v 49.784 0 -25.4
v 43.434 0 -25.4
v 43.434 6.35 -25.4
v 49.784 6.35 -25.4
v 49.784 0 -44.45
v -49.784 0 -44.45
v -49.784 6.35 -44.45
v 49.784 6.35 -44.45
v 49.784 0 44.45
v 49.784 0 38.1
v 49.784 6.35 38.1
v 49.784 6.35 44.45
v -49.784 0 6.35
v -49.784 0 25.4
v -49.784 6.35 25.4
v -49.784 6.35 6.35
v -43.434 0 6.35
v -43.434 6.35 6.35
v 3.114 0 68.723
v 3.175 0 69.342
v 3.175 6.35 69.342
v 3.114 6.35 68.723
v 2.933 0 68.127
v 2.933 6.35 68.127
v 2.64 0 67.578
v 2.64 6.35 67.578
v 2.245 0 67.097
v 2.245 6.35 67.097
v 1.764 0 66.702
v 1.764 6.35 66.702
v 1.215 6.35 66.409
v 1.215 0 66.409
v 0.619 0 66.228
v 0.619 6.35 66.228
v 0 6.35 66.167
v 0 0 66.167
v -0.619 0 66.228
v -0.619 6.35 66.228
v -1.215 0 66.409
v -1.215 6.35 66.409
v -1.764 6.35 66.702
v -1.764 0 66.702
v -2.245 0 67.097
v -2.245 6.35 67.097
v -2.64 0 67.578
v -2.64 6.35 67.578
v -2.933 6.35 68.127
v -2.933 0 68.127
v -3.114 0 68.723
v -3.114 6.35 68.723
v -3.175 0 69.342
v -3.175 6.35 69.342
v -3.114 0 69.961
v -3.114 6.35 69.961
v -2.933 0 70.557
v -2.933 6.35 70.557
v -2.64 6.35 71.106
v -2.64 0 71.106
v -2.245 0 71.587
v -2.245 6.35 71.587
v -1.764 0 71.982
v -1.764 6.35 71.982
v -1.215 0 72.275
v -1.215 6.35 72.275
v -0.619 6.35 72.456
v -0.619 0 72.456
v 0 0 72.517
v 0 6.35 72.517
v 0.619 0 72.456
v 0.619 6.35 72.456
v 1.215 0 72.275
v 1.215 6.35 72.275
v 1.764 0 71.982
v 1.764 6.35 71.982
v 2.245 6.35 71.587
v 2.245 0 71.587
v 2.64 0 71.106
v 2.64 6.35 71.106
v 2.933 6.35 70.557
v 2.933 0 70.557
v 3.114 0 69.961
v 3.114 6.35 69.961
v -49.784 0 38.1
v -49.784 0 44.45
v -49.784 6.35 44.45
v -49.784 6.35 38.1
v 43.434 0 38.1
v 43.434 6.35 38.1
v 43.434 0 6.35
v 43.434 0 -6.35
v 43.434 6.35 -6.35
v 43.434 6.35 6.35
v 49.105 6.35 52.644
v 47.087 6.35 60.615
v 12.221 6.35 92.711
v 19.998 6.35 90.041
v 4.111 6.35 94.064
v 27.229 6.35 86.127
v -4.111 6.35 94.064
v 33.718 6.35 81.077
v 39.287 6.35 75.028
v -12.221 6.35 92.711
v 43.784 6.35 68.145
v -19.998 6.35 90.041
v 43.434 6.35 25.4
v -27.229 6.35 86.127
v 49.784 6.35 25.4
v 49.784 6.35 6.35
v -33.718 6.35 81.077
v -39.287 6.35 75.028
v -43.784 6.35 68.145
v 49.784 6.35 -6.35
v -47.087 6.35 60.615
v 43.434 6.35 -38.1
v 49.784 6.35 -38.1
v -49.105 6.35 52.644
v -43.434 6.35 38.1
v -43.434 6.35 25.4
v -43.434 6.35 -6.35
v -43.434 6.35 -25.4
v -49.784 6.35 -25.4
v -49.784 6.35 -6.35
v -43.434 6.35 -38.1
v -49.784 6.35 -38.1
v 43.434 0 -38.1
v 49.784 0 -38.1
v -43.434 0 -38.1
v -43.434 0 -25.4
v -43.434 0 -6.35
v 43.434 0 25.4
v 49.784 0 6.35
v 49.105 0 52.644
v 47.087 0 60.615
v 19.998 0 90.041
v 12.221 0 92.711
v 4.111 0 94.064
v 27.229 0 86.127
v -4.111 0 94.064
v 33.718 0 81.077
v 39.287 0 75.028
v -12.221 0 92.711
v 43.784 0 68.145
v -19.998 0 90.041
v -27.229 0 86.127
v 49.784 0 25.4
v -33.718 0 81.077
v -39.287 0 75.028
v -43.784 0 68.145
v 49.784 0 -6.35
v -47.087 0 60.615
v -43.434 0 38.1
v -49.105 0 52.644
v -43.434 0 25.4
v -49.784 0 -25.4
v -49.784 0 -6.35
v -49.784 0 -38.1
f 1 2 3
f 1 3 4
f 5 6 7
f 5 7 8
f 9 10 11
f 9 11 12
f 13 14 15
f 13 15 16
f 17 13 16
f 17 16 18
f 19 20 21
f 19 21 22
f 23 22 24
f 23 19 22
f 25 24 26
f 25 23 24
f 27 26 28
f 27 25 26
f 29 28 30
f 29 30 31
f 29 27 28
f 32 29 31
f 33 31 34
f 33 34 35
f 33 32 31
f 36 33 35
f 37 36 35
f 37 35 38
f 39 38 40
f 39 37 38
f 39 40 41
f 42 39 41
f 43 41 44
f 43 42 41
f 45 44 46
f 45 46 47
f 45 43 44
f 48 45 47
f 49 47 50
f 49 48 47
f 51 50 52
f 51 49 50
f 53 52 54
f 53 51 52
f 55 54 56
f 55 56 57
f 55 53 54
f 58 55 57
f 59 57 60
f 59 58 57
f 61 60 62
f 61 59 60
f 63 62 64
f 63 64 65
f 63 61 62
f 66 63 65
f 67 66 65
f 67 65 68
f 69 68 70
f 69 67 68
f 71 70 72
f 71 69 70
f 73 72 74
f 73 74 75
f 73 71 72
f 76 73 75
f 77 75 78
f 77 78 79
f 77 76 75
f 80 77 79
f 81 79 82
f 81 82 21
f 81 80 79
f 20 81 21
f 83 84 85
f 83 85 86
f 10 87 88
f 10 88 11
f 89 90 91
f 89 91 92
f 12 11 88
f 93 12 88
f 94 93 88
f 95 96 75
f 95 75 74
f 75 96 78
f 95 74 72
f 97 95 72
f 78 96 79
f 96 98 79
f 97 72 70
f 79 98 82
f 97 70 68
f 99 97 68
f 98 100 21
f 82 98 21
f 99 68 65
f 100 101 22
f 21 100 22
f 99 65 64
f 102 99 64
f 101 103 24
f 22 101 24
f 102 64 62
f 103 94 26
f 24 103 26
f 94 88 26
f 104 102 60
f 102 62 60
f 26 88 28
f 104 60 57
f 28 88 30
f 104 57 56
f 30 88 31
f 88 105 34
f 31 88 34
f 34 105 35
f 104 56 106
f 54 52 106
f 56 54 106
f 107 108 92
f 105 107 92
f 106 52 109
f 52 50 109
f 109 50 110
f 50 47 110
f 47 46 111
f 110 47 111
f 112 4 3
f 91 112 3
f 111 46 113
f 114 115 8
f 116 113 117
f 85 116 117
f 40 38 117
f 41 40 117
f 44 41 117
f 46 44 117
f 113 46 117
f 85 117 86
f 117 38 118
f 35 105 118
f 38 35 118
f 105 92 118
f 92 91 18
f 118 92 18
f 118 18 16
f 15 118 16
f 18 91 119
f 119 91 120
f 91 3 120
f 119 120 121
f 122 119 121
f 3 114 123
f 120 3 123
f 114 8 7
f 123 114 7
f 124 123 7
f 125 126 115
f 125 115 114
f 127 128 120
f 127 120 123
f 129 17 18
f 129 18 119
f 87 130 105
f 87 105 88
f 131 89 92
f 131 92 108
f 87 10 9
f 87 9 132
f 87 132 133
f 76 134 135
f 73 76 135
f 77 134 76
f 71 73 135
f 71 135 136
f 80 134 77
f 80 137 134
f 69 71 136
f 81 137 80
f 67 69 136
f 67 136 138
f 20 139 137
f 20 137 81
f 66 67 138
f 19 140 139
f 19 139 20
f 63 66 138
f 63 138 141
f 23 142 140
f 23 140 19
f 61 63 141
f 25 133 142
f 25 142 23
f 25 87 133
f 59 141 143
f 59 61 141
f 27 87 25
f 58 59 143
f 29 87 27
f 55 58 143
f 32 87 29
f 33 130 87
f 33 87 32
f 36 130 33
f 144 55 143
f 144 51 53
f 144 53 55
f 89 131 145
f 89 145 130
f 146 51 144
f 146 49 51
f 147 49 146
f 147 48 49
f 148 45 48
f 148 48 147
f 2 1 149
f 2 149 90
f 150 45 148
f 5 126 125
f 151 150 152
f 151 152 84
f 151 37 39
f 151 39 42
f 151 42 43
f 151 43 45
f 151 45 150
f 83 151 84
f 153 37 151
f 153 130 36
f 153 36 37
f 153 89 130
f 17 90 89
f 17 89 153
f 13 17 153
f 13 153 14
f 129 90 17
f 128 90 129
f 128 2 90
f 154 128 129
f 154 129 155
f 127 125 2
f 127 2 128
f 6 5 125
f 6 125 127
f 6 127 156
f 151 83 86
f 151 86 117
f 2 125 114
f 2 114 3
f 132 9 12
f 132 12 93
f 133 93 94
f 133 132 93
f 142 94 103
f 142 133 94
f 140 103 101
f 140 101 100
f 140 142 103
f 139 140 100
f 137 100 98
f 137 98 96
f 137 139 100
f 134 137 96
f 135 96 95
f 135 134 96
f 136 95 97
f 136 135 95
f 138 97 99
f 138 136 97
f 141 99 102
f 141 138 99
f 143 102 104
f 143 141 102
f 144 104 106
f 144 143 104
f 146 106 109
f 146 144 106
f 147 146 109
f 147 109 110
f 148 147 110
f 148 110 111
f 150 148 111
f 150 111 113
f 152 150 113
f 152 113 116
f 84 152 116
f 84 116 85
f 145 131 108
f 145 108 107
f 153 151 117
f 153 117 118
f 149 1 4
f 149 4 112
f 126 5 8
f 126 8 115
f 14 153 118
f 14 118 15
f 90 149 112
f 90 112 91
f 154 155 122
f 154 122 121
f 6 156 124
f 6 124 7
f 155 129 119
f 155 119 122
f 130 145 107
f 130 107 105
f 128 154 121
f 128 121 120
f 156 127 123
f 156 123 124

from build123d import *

# Parameters (mm, degrees)
SKETCH1_R           = 3.175
BOSS_EXTRUDE1_DEPTH = 6.35


with BuildPart() as part:
    # Sketch1 → Boss-Extrude1 (new body)
    with BuildSketch(Plane(origin=(0, 0, 0), x_dir=(1, 0, 0), z_dir=(0, 1, 0))):
        with BuildLine():
            Line((-49.784, 44.45), (49.784, 44.45))
            Line((49.784, 44.45), (49.784, 38.1))
            Line((49.784, 38.1), (43.434, 38.1))
            Line((43.434, 38.1), (43.434, 25.4))
            Line((43.434, 25.4), (49.784, 25.4))
            Line((49.784, 25.4), (49.784, 6.35))
            Line((49.784, 6.35), (43.434, 6.35))
            Line((43.434, 6.35), (43.434, -6.35))
            Line((43.434, -6.35), (49.784, -6.35))
            Line((49.784, -6.35), (49.784, -25.4))
            Line((49.784, -25.4), (43.434, -25.4))
            Line((43.434, -25.4), (43.434, -38.1))
            Line((43.434, -38.1), (49.784, -38.1))
            Line((49.784, -38.1), (49.784, -44.45))
            ThreePointArc((49.784, -44.45), (0, -94.234), (-49.784, -44.45))
            Line((-49.784, -44.45), (-49.784, -38.1))
            Line((-49.784, -38.1), (-43.434, -38.1))
            Line((-43.434, -38.1), (-43.434, -25.4))
            Line((-43.434, -25.4), (-49.784, -25.4))
            Line((-49.784, -25.4), (-49.784, -6.35))
            Line((-49.784, -6.35), (-43.434, -6.35))
            Line((-43.434, -6.35), (-43.434, 6.35))
            Line((-43.434, 6.35), (-49.784, 6.35))
            Line((-49.784, 6.35), (-49.784, 25.4))
            Line((-49.784, 25.4), (-43.434, 25.4))
            Line((-43.434, 25.4), (-43.434, 38.1))
            Line((-43.434, 38.1), (-49.784, 38.1))
            Line((-49.784, 38.1), (-49.784, 44.45))
        make_face()
        with Locations((0, -69.342)):
            Circle(SKETCH1_R, mode=Mode.SUBTRACT)
    extrude(amount=BOSS_EXTRUDE1_DEPTH)


solid = part.part
